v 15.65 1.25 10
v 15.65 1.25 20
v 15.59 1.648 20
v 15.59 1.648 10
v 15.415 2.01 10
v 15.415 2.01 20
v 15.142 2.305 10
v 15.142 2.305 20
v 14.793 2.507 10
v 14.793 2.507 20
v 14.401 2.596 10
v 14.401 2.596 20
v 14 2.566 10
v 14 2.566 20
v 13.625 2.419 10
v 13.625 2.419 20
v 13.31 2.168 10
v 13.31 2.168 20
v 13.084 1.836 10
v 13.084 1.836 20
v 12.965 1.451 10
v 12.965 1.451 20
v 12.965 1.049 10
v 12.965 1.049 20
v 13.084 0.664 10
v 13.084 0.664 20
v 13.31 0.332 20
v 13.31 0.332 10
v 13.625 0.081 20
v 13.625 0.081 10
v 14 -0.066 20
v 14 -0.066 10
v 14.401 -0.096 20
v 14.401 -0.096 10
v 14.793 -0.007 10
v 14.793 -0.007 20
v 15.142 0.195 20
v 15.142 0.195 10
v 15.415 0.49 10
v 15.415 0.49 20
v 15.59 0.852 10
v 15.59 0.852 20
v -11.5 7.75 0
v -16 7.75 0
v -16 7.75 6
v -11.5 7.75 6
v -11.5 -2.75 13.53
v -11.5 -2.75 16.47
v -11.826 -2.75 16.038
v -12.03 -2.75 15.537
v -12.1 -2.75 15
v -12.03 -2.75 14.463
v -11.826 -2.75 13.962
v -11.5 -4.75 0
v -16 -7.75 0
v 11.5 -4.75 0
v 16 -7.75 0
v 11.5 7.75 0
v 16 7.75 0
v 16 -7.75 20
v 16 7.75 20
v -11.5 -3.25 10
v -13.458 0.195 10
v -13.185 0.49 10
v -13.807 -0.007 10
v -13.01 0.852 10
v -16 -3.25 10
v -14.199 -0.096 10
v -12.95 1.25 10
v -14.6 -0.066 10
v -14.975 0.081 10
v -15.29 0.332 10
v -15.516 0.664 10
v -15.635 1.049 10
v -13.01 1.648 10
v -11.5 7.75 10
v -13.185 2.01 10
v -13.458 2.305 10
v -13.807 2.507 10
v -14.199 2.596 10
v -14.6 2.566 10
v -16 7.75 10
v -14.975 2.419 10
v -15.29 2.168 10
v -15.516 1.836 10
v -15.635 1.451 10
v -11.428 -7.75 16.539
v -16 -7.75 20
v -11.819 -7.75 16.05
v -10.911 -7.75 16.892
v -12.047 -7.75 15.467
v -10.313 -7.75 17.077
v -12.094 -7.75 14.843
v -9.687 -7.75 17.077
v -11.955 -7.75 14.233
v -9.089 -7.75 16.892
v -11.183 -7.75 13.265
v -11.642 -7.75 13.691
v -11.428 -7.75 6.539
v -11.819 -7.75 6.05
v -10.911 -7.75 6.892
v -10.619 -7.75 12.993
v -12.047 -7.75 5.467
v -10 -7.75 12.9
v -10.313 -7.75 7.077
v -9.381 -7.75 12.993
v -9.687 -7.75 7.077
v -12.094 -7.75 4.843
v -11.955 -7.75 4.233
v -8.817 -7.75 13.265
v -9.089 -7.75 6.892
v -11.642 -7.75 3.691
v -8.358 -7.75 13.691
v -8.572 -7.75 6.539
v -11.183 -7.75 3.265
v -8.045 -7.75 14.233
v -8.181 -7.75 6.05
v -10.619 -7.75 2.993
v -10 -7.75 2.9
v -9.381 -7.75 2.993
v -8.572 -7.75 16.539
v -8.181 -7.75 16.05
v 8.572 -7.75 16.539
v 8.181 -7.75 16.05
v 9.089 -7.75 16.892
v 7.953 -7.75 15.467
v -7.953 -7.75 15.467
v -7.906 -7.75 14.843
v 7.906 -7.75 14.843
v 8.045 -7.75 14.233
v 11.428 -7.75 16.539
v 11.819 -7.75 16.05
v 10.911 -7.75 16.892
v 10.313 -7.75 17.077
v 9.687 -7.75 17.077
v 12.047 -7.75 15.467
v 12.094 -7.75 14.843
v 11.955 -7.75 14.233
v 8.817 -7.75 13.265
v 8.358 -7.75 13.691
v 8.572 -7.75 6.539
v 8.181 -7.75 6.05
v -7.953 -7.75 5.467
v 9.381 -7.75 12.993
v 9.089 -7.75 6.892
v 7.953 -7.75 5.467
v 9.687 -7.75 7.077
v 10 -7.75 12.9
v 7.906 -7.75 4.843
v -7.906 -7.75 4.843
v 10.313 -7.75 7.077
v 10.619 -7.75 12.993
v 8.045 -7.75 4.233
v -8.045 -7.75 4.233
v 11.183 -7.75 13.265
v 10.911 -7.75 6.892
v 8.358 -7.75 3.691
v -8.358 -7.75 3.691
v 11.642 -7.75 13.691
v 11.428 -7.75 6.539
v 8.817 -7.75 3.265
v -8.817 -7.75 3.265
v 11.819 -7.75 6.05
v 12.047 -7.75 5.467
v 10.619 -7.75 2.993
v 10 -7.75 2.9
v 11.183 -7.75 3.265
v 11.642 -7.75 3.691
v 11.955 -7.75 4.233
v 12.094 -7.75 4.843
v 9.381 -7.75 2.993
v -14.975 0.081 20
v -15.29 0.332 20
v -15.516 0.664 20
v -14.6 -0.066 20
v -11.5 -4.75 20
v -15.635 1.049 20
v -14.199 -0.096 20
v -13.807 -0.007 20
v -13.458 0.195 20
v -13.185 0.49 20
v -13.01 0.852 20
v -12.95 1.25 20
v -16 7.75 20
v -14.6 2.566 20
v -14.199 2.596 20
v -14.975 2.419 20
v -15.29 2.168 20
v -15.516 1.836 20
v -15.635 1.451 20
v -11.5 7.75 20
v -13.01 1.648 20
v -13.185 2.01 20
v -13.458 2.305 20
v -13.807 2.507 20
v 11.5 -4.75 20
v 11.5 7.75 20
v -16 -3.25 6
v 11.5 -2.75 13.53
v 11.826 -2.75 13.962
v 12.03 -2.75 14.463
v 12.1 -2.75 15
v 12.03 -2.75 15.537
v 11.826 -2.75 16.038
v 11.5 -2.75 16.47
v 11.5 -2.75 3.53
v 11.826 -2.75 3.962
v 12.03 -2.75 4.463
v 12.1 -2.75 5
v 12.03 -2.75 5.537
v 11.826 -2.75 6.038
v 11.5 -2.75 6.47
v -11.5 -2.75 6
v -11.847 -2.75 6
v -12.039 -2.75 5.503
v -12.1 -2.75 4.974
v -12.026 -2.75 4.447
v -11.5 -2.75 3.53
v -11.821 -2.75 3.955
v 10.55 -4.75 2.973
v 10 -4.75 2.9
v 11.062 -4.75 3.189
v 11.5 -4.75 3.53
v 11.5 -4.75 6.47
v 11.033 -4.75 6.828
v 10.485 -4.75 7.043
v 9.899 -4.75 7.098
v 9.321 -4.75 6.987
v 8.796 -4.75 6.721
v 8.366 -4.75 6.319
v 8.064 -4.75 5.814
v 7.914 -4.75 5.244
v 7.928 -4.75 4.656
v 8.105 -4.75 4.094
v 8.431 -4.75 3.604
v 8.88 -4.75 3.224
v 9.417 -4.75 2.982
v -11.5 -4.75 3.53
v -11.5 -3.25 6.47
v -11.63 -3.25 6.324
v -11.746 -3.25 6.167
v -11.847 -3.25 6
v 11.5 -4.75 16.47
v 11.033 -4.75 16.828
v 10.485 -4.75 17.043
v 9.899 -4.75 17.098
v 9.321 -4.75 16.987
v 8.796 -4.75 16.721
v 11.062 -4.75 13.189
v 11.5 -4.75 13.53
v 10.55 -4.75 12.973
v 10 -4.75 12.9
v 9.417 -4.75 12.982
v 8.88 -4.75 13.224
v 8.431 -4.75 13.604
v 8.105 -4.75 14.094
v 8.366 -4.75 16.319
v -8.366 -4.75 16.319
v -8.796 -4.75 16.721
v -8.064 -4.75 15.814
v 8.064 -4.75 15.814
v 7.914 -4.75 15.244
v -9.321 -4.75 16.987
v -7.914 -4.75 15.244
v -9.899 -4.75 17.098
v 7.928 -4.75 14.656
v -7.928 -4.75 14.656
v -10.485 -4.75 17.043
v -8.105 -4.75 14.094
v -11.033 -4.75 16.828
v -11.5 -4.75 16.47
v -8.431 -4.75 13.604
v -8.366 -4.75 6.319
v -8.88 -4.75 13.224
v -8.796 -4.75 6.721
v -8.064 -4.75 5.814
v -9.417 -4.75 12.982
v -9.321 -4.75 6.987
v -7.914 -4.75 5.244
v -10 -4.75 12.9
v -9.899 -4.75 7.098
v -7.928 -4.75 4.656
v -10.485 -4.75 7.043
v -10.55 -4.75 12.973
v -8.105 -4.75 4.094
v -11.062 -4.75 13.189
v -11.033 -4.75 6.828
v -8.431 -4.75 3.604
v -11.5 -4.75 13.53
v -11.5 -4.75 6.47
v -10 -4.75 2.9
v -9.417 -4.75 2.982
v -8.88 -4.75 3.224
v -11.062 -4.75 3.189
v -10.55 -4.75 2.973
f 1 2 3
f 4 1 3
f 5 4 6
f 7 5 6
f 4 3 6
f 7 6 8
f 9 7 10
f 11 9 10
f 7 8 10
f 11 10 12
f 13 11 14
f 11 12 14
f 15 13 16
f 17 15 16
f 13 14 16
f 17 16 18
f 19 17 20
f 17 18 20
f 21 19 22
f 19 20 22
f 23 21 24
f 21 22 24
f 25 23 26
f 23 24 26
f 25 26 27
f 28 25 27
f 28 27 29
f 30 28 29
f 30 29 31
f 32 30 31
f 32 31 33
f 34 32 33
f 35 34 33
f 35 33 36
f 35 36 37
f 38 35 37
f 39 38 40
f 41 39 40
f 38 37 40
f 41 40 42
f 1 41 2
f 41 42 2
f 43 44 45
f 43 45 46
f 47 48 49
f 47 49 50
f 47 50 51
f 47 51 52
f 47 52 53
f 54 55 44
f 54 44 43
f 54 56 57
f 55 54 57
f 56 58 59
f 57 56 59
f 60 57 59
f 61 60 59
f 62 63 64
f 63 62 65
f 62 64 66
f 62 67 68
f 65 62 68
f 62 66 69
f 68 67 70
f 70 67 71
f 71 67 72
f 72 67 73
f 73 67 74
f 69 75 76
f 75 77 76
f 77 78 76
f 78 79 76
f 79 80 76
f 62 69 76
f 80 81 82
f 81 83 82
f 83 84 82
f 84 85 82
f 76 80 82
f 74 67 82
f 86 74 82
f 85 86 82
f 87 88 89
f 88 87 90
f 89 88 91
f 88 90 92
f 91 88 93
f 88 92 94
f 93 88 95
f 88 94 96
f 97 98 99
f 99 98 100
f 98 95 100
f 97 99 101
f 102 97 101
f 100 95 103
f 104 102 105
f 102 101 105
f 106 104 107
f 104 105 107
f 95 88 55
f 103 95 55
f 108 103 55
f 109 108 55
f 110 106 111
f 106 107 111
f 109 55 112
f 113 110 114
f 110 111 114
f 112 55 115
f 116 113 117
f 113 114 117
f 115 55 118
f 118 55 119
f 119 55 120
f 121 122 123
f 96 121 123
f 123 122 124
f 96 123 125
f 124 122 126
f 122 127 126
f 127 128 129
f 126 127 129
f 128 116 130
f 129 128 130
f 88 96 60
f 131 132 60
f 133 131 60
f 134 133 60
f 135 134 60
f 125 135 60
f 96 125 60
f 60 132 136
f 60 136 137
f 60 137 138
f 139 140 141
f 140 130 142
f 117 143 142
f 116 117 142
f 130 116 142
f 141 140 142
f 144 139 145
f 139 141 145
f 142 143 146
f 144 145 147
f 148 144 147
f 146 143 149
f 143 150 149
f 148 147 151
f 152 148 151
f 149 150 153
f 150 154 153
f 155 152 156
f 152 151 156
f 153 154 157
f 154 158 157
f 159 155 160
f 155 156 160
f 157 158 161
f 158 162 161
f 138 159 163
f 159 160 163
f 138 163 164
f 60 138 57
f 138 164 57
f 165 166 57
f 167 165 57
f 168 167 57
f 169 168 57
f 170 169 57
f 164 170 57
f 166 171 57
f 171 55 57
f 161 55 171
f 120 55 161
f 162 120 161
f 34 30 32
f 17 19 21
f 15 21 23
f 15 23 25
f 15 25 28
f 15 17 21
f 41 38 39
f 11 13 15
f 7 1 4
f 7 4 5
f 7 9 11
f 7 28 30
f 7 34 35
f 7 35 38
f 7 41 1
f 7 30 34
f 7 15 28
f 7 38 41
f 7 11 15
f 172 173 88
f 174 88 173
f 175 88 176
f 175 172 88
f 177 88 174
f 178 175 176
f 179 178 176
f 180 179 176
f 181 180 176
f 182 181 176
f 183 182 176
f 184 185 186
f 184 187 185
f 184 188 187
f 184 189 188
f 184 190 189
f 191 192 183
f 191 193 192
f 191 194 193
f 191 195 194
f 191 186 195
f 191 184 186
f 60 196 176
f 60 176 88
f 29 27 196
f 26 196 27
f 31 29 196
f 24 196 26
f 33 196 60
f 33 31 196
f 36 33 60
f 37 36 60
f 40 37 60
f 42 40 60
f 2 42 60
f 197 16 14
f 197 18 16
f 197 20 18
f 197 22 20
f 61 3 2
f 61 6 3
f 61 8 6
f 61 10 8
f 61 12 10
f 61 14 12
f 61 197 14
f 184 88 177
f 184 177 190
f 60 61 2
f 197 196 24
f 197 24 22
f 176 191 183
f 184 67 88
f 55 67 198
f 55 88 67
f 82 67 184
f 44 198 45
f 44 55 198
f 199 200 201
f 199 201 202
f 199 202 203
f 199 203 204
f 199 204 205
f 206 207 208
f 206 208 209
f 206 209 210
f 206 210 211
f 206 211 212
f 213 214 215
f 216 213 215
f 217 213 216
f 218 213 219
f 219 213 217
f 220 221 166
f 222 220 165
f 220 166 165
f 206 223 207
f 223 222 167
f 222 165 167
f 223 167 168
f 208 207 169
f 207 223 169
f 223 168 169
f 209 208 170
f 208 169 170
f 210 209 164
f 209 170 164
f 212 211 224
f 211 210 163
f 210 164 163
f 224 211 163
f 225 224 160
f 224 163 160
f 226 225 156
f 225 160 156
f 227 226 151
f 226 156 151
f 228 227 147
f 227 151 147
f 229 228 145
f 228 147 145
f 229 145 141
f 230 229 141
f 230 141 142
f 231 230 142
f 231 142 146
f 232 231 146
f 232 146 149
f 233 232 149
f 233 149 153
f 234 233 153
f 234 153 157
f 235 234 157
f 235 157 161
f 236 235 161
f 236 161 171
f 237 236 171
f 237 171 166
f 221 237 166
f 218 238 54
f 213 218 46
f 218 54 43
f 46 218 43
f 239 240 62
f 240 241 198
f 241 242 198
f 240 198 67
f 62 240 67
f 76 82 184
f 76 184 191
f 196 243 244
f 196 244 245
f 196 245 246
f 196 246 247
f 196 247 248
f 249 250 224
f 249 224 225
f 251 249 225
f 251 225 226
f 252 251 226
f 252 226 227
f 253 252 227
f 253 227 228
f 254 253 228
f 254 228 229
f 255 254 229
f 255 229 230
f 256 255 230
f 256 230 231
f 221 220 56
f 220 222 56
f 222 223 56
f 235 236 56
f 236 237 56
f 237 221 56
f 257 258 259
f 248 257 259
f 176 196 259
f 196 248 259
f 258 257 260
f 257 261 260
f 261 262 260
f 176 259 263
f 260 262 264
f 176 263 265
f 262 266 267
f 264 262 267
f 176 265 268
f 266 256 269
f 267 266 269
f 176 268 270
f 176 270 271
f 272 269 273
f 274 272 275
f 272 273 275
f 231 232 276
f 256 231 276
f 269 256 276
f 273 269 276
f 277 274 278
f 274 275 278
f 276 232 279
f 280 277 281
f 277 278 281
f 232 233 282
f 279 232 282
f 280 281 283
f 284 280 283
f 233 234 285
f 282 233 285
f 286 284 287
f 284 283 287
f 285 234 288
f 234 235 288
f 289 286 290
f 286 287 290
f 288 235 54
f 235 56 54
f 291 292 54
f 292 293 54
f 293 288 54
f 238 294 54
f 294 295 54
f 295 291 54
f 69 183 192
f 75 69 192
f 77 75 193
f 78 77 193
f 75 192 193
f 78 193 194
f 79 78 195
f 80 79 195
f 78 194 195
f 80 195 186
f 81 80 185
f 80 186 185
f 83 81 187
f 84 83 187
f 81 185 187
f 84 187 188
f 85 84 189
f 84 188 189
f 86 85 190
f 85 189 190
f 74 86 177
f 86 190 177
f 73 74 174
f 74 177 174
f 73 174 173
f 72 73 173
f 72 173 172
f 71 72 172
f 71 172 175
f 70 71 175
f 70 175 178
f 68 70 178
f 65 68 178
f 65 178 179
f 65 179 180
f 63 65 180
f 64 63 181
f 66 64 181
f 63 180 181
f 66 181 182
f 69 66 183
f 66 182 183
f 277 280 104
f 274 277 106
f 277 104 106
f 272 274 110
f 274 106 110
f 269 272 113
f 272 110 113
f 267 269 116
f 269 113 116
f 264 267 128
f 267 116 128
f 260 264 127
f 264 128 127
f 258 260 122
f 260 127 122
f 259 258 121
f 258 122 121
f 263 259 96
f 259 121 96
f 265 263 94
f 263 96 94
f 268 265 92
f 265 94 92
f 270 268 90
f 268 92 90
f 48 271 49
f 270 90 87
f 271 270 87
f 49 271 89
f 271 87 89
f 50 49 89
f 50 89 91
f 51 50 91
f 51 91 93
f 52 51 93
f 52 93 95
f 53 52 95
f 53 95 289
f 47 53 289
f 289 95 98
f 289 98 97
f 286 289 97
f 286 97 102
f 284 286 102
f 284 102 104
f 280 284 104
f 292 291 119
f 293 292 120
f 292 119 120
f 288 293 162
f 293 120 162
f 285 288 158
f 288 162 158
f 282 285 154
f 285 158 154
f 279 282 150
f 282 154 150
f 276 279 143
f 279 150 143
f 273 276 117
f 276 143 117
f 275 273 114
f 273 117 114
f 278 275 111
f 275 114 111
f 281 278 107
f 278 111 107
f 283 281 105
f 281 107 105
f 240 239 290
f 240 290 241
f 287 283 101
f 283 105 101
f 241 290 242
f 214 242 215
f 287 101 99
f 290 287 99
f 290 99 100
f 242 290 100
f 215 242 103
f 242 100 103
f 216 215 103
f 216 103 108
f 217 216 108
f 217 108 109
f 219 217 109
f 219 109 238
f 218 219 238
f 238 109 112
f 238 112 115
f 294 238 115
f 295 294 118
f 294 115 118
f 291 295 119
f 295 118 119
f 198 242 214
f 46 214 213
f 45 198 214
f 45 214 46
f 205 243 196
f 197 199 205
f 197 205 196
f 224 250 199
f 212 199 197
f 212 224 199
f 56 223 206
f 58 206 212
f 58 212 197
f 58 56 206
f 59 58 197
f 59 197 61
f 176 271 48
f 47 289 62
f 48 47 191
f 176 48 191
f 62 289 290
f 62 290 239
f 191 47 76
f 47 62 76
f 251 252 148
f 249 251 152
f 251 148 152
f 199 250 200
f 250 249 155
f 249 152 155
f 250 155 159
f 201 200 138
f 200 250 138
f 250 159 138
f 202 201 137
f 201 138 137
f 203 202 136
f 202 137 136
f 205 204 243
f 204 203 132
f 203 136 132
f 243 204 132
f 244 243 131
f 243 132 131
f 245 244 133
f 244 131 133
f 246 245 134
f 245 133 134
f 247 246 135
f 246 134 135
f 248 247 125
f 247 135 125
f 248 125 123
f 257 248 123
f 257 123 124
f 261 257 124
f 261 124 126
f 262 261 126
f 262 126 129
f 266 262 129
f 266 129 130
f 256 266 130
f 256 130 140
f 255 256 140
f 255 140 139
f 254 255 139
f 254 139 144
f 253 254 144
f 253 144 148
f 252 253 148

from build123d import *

# Parameters (mm, degrees)
SKETCH_4_W          = 32
SKETCH_4_H          = 15.5
EXTRUDE_2_DEPTH     = 20
SKETCH_6_W          = 23
SKETCH_6_H          = 12.5
CUT_EXTRUDE_1_DEPTH = 27.759344162
CUT_EXTRUDE_2_REACH = 40.524
SKETCH_7_W          = 4
SKETCH_7_H          = 11
SKETCH_9_R          = 1.35
CUT_EXTRUDE_3_DEPTH = 10
SKETCH_11_R         = 2.1
CUT_EXTRUDE_4_DEPTH = 5


with BuildPart() as part:
    # Эскиз4 → Бобышка-Вытянуть2 (new body)
    with BuildSketch(Plane.XY):
        Rectangle(SKETCH_4_W, SKETCH_4_H)
    extrude(amount=EXTRUDE_2_DEPTH)

    # Эскиз6 → Вырез-Вытянуть1 (cut, through all)
    with BuildSketch(Plane(origin=(0, 0, 0), x_dir=(-1, 0, 0), z_dir=(0, 0, -1))):
        with Locations((0, 1.5)):
            Rectangle(SKETCH_6_W, SKETCH_6_H)
    extrude(amount=-CUT_EXTRUDE_1_DEPTH, mode=Mode.SUBTRACT)

    # Эскиз7 → Вырез-Вытянуть2 (cut, up to next)
    with BuildSketch(Plane.ZY.offset(16), mode=Mode.PRIVATE) as cut_extrude_2_sk1:
        with Locations((8, 2.25)):
            Rectangle(SKETCH_7_W, SKETCH_7_H)
    cut_extrude_2_tool1 = extrude(cut_extrude_2_sk1.sketch, amount=-CUT_EXTRUDE_2_REACH, mode=Mode.PRIVATE) & part.part
    add(cut_extrude_2_tool1.solids().sort_by_distance((-16, 2.25, 8))[0], mode=Mode.SUBTRACT)

    # Эскиз9 → Вырез-Вытянуть3 (cut)
    with BuildSketch(Plane.XY.offset(20)):
        with Locations((-14.3, 1.25)):
            Circle(SKETCH_9_R)
        with Locations((14.3, 1.25)):
            Circle(SKETCH_9_R)
    extrude(amount=-CUT_EXTRUDE_3_DEPTH, mode=Mode.SUBTRACT)

    # Эскиз11 → Вырез-Вытянуть4 (cut)
    with BuildSketch(Plane.XZ.offset(7.75)):
        with Locations(Location((-10, 15, 0), (0, 0, 270))):
            Circle(SKETCH_11_R)
        with Locations(Location((10, 15, 0), (0, 0, 270))):
            Circle(SKETCH_11_R)
        with Locations(Location((10, 5, 0), (0, 0, 270))):
            Circle(SKETCH_11_R)
        with Locations(Location((-10, 5, 0), (0, 0, 270))):
            Circle(SKETCH_11_R)
    extrude(amount=-CUT_EXTRUDE_4_DEPTH, mode=Mode.SUBTRACT)


solid = part.part
